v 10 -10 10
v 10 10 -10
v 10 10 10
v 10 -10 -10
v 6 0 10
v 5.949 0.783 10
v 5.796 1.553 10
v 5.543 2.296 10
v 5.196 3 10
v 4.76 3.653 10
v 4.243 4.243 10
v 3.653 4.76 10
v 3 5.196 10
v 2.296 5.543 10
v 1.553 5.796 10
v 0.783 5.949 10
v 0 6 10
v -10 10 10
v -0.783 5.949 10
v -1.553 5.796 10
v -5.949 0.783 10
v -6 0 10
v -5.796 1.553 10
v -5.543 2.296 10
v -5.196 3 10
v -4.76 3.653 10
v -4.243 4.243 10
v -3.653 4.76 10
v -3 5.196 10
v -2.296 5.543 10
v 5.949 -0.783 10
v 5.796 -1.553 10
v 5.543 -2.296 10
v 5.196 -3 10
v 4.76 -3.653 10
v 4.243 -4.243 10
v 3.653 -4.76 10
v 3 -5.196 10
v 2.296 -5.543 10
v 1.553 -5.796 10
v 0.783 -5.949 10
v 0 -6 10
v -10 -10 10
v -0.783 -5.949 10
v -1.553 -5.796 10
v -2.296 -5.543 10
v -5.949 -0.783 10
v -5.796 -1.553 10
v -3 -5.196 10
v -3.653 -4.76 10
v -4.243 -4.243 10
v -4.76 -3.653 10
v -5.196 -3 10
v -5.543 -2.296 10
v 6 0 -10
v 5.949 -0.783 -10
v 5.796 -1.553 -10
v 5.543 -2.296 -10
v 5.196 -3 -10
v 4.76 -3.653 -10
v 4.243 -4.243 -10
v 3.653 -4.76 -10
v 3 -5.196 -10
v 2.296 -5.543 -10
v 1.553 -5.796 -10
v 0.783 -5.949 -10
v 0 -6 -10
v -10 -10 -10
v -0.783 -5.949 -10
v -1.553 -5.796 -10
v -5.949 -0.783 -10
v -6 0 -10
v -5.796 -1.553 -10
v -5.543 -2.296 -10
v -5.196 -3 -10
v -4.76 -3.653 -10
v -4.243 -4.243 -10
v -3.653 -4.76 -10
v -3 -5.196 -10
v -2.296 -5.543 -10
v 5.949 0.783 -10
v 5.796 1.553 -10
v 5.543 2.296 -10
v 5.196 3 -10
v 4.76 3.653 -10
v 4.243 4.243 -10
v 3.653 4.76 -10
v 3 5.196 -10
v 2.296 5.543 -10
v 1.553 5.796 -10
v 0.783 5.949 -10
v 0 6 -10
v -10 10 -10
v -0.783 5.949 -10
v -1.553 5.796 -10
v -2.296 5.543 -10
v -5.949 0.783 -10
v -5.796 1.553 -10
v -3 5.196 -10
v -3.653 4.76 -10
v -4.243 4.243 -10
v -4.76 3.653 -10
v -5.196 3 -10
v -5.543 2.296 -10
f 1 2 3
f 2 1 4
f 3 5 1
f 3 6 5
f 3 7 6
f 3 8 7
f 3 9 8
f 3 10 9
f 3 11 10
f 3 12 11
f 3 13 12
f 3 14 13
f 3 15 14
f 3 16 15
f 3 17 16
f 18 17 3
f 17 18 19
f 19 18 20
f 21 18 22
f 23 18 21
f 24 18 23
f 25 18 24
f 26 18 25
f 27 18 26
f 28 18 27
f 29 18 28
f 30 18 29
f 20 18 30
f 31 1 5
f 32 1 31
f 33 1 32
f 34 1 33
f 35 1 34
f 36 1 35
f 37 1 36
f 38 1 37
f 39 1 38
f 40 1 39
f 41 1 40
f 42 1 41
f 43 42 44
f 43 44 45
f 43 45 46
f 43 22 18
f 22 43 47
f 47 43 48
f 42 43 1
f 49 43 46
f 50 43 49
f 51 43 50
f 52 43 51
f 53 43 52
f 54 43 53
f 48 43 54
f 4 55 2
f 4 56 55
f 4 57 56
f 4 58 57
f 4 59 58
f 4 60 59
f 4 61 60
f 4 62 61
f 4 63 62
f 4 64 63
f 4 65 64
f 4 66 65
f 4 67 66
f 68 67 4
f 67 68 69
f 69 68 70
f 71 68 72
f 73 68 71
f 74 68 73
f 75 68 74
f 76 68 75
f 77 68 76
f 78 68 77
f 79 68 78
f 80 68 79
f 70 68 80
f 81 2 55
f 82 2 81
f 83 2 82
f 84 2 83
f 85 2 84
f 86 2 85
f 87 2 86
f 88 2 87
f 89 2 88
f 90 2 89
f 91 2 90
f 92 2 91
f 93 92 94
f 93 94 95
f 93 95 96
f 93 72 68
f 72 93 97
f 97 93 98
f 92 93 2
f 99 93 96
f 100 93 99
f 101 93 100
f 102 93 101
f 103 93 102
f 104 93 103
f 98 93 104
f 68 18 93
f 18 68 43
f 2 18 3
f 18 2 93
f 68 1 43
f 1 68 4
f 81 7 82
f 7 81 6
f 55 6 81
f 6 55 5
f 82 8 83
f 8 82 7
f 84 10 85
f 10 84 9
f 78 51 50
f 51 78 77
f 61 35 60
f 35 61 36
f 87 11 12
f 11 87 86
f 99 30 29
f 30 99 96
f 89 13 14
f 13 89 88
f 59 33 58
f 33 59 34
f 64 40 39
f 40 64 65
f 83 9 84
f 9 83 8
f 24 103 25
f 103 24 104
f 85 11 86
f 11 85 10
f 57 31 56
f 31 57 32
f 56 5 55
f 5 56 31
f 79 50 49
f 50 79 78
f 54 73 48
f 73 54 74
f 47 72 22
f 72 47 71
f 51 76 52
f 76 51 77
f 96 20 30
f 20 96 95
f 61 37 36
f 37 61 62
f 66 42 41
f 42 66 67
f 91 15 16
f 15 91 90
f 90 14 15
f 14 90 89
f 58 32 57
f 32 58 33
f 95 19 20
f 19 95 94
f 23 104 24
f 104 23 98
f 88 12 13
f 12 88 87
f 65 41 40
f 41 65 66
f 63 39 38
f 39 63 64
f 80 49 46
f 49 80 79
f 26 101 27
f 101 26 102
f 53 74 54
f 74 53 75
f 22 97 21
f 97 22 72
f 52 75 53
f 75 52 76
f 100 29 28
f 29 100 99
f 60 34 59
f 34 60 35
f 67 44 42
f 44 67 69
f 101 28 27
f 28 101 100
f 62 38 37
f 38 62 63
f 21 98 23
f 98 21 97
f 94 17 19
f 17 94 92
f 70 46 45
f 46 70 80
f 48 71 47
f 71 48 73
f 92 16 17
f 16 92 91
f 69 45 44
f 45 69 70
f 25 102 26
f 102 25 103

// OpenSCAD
// Construct: difference() — subtract a bore from a block.
difference() {
    cube(20, center = true);
    cylinder(h = 30, r = 6, center = true, $fn = 48);
}
